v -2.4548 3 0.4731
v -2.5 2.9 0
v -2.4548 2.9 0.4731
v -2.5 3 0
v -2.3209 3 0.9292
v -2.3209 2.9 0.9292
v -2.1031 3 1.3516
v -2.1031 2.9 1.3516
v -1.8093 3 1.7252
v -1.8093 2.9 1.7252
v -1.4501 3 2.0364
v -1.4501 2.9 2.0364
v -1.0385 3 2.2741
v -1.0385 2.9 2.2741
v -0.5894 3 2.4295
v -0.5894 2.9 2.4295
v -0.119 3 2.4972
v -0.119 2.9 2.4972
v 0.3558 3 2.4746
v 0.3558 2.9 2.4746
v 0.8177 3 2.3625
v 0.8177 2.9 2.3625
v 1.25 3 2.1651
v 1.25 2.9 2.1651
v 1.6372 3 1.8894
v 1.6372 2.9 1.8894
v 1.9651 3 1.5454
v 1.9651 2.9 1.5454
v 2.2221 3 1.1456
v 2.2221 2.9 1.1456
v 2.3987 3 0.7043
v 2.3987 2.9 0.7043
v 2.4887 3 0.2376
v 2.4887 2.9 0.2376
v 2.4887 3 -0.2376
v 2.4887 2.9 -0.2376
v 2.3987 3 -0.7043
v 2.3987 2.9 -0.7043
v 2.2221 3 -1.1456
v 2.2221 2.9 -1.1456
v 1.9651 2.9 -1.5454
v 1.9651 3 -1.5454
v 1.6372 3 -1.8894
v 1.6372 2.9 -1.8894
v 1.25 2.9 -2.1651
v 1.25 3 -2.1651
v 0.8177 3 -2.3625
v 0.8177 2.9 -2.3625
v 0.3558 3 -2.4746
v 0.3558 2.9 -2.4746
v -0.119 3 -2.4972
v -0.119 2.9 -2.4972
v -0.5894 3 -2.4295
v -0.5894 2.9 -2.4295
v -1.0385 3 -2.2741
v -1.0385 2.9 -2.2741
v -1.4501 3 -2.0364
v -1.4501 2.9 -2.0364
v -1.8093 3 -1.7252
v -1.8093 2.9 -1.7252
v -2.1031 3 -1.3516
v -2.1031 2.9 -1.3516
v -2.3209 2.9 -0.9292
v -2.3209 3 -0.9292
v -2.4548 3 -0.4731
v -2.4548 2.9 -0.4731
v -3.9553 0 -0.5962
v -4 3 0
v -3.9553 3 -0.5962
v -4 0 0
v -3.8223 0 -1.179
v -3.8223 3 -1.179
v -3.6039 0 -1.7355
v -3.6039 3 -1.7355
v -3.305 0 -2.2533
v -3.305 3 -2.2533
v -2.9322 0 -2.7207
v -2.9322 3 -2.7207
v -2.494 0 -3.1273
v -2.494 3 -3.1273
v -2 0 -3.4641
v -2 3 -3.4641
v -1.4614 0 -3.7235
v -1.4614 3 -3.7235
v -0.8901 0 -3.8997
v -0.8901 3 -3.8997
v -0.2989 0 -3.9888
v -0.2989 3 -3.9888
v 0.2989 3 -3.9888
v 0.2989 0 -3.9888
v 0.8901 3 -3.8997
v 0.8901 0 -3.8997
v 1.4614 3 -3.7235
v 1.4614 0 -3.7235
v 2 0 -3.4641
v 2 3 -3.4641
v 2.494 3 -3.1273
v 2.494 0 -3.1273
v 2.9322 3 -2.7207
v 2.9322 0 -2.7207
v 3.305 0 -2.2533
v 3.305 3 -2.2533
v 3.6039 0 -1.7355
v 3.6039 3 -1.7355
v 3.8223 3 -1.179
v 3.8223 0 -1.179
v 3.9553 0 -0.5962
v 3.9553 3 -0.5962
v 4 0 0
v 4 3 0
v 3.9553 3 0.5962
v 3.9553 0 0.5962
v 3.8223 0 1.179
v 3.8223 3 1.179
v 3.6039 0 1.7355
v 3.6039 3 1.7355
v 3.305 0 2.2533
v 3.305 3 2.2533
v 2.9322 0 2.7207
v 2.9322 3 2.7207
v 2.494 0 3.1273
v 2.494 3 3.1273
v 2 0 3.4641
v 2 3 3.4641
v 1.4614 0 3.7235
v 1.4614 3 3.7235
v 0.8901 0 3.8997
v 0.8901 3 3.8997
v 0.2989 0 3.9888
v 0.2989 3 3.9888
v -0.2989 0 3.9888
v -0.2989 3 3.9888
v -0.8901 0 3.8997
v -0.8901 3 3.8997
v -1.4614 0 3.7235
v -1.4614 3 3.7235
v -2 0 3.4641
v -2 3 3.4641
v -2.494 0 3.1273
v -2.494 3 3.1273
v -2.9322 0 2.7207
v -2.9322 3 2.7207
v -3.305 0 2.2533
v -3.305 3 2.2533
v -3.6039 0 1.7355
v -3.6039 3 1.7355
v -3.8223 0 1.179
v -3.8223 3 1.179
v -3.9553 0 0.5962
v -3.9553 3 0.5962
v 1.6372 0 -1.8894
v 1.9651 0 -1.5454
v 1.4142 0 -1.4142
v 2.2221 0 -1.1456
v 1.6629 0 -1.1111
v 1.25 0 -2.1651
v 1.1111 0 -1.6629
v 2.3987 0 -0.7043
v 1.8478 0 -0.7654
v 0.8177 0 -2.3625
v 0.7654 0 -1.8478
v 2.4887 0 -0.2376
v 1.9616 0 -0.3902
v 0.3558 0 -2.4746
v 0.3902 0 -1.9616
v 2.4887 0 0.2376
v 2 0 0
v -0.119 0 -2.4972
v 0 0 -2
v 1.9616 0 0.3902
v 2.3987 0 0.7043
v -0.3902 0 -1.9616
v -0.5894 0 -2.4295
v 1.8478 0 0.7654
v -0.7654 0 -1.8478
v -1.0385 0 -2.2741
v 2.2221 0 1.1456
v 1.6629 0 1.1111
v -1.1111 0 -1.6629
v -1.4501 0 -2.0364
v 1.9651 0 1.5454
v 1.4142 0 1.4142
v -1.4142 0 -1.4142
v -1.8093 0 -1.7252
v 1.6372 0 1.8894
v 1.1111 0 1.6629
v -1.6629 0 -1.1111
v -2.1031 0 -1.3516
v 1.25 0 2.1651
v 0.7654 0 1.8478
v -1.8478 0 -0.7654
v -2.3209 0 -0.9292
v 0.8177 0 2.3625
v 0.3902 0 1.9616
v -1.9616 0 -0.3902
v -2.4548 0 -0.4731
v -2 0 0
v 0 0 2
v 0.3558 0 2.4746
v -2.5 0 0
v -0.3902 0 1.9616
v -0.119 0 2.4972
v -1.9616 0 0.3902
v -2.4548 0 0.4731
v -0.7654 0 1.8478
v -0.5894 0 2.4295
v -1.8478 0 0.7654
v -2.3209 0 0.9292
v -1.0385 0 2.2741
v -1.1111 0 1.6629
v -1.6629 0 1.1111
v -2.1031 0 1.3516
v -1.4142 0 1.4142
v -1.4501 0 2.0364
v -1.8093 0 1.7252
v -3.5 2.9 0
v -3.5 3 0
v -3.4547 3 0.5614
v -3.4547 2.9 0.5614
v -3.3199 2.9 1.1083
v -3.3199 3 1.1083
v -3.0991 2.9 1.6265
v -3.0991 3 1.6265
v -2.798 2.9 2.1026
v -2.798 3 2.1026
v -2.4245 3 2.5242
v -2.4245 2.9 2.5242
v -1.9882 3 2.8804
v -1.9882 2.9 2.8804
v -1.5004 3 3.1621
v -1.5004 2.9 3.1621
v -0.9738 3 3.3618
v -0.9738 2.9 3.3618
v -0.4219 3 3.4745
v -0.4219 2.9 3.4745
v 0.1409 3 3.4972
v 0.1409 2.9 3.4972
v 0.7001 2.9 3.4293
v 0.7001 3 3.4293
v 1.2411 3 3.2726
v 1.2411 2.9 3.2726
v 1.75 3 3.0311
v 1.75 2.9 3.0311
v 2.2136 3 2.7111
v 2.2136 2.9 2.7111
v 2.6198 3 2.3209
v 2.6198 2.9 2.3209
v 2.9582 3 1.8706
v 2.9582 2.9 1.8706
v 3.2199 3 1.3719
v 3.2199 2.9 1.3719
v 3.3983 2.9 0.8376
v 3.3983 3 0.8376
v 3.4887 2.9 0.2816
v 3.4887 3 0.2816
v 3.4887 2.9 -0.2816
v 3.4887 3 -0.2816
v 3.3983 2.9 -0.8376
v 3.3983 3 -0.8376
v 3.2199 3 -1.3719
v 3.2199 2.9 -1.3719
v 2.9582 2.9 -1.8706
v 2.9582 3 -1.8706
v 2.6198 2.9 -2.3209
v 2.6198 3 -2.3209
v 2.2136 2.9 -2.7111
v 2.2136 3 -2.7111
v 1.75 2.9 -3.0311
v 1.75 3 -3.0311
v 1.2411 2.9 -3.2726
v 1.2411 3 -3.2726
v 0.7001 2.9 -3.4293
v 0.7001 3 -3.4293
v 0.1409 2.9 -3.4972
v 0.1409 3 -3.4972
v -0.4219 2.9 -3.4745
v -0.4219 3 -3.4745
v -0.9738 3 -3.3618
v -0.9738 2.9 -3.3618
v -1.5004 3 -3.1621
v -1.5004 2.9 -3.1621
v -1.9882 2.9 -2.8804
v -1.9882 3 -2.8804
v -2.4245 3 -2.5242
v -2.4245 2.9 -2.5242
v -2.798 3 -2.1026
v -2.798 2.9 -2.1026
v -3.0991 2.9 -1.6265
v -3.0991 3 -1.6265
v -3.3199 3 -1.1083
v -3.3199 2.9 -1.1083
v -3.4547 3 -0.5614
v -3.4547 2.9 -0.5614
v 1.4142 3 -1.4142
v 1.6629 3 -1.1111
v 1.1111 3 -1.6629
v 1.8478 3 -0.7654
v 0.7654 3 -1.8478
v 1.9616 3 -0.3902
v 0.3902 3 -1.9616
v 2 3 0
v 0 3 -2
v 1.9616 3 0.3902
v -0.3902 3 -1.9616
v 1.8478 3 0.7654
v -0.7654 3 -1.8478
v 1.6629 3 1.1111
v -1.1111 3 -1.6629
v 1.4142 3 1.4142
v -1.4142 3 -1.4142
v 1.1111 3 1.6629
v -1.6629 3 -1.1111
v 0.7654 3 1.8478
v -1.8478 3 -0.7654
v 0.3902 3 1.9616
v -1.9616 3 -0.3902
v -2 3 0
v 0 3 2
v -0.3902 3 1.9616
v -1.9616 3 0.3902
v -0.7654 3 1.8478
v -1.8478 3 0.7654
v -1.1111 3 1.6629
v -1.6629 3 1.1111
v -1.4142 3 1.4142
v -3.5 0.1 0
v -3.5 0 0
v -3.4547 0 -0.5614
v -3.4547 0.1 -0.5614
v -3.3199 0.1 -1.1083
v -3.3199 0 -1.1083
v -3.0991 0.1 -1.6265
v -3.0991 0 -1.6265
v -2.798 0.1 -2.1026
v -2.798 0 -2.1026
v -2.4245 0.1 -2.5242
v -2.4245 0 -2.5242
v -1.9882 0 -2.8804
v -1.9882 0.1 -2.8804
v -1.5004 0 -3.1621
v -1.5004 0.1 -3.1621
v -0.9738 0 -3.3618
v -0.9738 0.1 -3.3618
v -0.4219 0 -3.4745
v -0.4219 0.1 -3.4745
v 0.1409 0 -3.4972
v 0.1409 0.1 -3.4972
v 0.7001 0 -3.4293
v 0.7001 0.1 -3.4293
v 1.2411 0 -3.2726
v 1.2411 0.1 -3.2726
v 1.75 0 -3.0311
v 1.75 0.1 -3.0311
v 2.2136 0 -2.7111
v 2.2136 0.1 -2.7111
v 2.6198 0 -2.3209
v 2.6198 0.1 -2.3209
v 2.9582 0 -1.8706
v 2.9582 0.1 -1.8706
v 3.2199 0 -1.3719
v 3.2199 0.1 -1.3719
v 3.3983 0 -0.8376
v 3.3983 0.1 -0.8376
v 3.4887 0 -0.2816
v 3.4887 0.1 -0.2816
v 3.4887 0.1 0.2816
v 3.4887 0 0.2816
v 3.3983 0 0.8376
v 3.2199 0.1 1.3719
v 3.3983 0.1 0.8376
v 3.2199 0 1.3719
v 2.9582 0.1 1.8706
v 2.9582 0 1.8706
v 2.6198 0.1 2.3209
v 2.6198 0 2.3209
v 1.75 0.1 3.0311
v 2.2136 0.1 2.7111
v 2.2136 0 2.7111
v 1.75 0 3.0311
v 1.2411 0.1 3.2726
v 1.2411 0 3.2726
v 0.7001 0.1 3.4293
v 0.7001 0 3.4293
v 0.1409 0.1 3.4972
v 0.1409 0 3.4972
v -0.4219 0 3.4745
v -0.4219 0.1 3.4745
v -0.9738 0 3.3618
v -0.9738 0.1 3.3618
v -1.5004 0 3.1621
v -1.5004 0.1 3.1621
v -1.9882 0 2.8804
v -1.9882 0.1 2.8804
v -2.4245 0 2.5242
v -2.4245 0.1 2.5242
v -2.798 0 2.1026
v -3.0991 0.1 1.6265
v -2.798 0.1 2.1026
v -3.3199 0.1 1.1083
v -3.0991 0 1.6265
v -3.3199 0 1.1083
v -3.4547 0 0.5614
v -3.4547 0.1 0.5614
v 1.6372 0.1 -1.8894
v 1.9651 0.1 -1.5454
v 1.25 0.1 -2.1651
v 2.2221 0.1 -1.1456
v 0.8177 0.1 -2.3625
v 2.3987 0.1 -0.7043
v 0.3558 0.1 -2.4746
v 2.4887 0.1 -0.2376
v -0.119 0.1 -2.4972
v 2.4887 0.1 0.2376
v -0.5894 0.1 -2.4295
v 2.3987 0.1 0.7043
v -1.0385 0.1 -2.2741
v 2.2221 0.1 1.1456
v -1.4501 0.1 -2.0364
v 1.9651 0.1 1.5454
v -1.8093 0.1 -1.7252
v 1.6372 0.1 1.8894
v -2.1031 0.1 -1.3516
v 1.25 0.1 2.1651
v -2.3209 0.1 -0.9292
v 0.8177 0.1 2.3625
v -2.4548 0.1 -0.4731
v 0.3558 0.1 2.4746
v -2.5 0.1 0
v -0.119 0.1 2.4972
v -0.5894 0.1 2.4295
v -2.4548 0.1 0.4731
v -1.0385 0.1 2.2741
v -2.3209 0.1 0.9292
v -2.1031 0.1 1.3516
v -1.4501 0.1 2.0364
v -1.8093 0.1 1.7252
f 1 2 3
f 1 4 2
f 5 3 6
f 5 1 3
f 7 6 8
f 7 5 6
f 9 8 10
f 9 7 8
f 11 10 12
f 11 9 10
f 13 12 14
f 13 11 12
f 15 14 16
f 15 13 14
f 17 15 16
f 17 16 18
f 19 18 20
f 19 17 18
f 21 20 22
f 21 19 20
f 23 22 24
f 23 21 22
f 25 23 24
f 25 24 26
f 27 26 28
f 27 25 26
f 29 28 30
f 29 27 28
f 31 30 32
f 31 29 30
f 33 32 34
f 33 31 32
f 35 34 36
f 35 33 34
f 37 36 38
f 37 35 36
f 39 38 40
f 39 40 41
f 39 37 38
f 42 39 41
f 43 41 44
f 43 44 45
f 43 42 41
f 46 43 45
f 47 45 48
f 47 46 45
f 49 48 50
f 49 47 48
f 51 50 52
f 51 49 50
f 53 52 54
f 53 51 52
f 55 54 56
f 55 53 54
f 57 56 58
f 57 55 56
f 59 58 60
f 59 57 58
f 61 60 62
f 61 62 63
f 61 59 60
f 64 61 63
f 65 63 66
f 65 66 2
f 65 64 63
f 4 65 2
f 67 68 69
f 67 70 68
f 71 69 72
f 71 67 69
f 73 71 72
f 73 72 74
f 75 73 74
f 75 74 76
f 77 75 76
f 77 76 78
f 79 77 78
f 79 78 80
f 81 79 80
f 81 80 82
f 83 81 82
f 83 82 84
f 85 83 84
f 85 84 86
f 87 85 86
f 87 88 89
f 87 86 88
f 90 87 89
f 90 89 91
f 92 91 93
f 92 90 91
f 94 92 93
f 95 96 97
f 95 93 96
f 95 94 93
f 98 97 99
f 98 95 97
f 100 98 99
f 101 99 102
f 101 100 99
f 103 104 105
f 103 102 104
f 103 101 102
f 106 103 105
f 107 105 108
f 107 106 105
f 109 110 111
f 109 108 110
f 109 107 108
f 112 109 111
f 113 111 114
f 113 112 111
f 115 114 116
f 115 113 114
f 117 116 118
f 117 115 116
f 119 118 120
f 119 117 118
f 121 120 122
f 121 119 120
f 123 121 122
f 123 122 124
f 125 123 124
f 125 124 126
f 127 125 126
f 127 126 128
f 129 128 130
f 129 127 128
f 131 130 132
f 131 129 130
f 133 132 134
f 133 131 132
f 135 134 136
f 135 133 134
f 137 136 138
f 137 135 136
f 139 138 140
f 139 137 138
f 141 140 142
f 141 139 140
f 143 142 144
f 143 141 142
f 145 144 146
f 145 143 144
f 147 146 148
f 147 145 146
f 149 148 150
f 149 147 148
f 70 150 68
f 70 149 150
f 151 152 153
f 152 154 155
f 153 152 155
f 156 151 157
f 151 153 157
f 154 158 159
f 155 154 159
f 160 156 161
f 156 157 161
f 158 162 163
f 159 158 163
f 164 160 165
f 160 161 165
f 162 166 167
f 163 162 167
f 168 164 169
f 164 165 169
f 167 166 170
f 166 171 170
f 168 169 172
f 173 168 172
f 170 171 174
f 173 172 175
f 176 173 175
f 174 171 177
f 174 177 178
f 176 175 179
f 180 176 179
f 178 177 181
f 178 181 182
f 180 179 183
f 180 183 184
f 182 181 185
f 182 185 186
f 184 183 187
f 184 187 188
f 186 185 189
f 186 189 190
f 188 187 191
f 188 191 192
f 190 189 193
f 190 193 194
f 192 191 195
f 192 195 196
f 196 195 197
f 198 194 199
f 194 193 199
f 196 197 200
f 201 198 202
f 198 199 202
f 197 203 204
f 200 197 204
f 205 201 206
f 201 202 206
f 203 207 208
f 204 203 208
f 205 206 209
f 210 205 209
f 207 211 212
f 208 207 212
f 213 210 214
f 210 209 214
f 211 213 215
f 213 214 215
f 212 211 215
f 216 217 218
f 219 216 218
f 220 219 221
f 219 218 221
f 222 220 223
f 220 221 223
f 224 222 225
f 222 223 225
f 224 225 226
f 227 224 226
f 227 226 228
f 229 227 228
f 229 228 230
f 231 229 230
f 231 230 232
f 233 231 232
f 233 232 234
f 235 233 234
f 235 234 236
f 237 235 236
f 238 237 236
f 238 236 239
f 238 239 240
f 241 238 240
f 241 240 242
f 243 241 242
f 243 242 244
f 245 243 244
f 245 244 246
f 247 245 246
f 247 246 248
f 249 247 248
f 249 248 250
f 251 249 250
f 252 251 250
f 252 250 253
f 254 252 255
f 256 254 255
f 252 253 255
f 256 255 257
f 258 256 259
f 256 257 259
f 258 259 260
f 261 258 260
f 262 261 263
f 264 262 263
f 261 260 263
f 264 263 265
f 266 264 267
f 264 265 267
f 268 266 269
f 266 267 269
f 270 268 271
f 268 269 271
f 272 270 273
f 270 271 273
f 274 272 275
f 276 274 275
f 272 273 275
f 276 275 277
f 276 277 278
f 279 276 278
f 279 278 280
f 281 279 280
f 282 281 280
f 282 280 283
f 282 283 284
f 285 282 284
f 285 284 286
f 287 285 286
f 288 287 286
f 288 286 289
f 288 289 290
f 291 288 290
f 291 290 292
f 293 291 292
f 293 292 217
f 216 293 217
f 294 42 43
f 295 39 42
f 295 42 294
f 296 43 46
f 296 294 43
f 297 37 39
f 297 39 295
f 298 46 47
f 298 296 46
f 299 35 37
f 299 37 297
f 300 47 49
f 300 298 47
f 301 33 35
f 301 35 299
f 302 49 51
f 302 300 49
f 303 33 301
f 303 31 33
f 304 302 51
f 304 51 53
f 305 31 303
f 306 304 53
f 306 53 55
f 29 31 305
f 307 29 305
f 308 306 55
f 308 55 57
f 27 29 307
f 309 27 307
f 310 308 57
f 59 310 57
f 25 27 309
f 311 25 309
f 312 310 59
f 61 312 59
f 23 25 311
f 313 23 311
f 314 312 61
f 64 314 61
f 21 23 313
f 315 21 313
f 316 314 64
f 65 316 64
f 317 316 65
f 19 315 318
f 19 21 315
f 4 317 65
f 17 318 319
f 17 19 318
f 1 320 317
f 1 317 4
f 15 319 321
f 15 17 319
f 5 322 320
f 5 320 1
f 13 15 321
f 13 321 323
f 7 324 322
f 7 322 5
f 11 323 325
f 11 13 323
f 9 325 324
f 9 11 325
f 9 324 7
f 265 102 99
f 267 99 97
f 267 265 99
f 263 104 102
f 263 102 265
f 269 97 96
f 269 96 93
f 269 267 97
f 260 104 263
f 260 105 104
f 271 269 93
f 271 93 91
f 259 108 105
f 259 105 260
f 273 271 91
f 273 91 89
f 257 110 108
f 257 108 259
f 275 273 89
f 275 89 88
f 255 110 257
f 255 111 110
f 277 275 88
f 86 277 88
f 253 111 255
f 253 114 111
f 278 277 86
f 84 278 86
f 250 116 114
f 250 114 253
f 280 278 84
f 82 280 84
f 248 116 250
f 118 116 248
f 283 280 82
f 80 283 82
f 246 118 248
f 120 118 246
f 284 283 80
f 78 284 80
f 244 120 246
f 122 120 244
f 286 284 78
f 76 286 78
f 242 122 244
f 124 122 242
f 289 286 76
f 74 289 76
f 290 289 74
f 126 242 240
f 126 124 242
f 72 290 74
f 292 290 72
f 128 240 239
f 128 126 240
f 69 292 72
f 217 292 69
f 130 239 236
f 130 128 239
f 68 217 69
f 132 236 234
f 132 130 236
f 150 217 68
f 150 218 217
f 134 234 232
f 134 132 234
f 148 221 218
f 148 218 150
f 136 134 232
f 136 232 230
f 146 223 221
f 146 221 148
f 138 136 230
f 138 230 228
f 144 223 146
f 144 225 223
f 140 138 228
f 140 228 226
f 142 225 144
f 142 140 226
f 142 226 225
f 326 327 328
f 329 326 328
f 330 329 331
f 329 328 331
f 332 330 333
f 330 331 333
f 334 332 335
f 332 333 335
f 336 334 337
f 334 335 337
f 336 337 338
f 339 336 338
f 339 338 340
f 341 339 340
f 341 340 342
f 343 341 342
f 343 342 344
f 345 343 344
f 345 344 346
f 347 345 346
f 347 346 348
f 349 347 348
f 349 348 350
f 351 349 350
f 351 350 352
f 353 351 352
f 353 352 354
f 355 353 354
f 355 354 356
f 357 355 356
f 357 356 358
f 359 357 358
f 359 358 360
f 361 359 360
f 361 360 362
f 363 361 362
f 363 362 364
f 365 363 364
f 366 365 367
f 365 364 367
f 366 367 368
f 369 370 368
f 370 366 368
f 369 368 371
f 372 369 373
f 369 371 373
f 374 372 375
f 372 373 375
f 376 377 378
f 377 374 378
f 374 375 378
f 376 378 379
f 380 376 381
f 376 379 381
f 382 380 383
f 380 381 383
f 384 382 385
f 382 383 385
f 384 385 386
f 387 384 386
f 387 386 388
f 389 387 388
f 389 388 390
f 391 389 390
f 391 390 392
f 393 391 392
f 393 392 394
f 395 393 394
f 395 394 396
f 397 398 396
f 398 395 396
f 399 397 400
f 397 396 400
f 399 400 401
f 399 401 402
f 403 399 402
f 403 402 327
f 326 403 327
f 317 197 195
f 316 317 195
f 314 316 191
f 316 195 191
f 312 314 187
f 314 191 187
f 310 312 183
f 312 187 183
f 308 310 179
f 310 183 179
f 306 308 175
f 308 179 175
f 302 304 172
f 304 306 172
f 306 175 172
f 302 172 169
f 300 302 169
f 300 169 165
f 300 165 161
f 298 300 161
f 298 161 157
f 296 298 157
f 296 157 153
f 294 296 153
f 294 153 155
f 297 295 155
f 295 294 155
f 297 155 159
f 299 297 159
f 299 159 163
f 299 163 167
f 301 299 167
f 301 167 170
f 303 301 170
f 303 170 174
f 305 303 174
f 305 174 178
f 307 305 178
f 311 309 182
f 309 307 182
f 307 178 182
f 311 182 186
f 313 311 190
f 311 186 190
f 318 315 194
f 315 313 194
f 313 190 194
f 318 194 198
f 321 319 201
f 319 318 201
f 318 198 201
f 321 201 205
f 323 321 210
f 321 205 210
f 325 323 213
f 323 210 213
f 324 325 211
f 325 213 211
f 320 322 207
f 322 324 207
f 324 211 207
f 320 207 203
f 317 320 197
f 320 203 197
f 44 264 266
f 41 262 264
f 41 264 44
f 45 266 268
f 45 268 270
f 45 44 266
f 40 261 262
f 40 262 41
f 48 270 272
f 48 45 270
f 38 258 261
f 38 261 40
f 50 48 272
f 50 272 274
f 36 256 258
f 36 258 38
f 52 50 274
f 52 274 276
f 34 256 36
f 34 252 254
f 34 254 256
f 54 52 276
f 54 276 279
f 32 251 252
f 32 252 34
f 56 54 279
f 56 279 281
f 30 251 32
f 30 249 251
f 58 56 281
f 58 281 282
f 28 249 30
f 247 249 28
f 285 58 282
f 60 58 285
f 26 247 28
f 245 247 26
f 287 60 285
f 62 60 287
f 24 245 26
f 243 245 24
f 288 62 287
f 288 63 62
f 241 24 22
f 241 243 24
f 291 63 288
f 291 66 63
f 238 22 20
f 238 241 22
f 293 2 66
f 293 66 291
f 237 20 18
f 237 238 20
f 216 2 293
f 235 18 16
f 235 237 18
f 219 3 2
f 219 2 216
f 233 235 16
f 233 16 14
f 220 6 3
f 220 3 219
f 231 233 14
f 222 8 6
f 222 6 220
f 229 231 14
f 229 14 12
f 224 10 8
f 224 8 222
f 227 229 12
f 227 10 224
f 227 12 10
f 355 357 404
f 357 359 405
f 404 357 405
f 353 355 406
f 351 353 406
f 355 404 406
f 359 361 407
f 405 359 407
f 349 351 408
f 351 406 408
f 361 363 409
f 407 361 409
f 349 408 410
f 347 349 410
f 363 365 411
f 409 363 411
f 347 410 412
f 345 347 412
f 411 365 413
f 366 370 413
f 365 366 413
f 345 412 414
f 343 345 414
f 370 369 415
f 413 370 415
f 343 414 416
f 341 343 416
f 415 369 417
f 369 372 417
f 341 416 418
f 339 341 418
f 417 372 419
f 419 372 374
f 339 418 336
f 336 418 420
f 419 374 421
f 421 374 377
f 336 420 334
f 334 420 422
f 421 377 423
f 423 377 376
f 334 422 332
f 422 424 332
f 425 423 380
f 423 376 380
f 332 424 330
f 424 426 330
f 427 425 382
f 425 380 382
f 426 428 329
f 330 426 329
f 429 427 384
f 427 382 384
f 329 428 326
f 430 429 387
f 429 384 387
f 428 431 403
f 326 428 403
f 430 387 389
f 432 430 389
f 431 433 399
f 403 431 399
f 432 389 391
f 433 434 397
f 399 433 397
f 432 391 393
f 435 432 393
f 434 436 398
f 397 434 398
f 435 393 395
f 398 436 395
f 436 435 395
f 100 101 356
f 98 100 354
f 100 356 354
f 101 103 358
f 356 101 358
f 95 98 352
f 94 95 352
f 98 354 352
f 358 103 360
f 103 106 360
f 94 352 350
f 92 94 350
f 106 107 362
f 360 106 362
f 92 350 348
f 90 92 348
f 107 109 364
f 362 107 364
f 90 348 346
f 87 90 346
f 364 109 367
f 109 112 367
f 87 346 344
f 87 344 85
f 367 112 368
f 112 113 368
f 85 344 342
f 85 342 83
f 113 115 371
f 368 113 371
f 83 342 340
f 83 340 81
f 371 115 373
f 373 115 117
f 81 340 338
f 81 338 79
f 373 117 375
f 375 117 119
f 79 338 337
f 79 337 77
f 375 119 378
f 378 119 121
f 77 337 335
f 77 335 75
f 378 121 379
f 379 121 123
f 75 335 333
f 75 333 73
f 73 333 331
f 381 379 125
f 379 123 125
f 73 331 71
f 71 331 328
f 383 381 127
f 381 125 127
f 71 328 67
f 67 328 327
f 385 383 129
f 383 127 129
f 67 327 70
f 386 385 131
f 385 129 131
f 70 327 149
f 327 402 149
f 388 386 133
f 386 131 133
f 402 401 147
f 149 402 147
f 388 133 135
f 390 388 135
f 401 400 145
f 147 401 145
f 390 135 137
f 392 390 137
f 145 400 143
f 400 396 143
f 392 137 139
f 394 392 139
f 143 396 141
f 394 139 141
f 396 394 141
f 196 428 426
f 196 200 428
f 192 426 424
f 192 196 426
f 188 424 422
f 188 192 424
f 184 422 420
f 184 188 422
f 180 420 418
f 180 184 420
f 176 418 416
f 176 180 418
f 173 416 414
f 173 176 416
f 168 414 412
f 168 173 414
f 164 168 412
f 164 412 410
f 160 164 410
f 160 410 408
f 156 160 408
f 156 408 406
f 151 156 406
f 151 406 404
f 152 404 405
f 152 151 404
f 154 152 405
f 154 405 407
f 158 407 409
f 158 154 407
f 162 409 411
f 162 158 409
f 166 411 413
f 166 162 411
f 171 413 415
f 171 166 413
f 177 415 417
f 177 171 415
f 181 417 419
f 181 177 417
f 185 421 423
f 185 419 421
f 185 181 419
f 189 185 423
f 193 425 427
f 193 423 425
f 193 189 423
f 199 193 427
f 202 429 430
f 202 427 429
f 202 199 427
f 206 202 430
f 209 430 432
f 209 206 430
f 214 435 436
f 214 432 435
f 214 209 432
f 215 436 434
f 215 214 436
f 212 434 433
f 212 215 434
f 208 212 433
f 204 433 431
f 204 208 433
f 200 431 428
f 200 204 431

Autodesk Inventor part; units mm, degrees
ref_plane "YZ Plane" through (0, 0, 0) normal (1, 0, 0) x (0, 1, 0)
ref_plane "XZ Plane" through (0, 0, 0) normal (0, 1, 0) x (-1, 0, 0)
ref_plane "XY Plane" through (0, 0, 0) normal (0, 0, 1) x (1, 0, 0)
sketch "Sketch1" plane through (0, 0, 0) normal (0, 1, 0) x (-1, 0, 0)
  circle A0 centre (0, 0) radius 4
  circle A1 centre (0, 0) radius 2.5
  circle A2 centre (0, 0) radius 2
  circle A3 centre (0, 0) radius 3.5
  dimension "d0" = 8
  dimension "d1" = 5
  dimension "d2" = 4
  dimension "d3" = 7
extrude "Extrusion1" add sketch "Sketch1" along normal blind 3 contours A0 | A1 | A3
extrude "Extrusion2" cut sketch "Sketch1" against normal blind 0.1 from surface at 3 contours A3
extrude "Extrusion3" cut sketch "Sketch1" along normal blind 0.1 contours A3
properties part number "Miniatur Kugellager MR 84 2RS 4x8x3 mm"
